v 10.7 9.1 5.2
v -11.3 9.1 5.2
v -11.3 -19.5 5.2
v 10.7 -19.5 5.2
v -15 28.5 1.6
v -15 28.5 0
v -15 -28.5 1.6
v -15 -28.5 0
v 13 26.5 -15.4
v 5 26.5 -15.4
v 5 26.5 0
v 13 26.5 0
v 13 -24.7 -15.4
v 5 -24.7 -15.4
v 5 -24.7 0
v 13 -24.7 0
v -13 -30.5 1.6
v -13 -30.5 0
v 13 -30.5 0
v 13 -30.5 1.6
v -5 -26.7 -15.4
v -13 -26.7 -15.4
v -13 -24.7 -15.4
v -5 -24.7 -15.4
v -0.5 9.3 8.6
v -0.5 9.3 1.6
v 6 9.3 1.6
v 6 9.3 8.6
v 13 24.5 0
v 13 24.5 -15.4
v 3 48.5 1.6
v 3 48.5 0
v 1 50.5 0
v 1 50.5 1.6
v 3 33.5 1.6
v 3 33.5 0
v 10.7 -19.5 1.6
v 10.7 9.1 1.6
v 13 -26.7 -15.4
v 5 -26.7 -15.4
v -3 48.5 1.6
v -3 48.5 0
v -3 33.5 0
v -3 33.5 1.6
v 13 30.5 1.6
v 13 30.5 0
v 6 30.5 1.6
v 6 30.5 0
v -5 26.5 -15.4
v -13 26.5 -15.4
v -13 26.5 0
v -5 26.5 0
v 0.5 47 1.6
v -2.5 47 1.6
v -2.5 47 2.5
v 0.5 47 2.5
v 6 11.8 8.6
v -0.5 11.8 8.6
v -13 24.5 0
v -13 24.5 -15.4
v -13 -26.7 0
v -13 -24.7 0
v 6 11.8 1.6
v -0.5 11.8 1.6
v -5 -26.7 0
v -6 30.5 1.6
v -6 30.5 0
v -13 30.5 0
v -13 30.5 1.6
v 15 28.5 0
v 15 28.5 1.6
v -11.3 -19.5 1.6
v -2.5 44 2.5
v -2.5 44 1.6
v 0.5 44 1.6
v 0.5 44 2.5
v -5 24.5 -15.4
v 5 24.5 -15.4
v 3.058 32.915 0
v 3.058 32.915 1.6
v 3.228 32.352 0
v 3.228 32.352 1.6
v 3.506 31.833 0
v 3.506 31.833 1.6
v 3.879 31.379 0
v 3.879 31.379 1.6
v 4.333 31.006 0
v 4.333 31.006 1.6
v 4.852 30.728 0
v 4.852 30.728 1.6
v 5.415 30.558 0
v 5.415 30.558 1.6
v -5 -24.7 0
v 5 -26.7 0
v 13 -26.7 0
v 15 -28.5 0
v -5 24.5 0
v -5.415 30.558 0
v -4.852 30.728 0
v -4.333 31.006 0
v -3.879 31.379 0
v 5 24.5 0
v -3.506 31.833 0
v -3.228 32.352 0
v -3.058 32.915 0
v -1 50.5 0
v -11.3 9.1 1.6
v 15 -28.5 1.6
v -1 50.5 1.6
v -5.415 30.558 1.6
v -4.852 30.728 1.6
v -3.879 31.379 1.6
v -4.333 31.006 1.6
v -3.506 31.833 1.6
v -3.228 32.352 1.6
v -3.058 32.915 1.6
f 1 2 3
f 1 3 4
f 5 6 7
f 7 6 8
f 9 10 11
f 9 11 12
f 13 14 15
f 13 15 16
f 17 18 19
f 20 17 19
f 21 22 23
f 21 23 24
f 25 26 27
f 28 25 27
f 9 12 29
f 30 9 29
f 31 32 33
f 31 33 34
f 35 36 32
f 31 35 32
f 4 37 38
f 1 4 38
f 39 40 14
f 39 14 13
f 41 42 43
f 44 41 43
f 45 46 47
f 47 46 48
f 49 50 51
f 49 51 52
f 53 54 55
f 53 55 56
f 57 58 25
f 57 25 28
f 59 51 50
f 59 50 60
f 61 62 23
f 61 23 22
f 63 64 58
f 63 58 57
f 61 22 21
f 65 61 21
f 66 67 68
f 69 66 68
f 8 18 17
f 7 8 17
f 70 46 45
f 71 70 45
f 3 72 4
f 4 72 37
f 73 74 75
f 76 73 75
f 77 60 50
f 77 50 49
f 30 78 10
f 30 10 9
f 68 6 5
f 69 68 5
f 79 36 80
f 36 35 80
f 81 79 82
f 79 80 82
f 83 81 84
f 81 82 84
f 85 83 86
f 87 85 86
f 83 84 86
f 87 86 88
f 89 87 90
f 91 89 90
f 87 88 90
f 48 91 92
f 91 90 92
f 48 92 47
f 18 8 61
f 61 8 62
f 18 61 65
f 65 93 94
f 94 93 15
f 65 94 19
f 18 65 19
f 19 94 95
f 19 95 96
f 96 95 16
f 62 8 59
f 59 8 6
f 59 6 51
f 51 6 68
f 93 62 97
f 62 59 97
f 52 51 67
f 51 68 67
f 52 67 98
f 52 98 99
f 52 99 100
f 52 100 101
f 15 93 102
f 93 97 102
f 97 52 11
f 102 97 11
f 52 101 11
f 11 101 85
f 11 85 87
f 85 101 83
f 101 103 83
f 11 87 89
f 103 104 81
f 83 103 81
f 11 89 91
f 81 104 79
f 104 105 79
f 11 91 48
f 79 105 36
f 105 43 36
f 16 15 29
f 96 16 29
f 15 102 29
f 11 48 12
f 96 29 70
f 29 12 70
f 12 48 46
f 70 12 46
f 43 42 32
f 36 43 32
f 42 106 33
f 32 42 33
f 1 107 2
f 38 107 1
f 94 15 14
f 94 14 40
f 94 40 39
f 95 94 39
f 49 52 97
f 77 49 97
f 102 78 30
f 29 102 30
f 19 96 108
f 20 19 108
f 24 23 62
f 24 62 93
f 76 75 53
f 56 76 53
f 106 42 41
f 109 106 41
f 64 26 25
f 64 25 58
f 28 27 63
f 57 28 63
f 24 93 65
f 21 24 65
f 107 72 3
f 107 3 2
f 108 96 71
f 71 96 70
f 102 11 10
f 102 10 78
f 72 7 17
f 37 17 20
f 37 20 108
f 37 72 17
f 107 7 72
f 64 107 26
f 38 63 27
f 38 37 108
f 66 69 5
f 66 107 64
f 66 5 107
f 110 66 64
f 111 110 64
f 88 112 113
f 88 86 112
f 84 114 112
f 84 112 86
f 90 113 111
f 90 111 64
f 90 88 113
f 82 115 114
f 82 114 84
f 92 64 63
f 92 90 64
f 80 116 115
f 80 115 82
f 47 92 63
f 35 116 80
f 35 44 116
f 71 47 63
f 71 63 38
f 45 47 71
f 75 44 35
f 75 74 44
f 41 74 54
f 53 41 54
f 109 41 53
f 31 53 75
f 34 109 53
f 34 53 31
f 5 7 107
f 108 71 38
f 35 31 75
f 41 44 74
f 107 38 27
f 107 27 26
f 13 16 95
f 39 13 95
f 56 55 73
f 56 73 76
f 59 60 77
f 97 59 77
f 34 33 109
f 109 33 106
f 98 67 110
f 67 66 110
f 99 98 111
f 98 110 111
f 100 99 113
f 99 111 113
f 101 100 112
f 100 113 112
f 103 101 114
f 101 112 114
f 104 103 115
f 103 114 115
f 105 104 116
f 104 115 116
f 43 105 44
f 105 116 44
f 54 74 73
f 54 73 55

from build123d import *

# Parameters (mm, degrees)
F1_DEPTH = 1.6
F2_W     = 22
F2_H     = 28.6
F3_DEPTH = 3.6
F2_W_2   = 6.5
F2_H_2   = 2.5
F4_DEPTH = 7
F2_W_3   = 3
F2_H_3   = 3
F5_DEPTH = 0.9
F6_W     = 8
F6_H     = 2
F7_DEPTH = 15.4
F8_R     = 3
F9_SIZE  = 2


with BuildPart() as f1:
    # F0 (on Top) → F1 (new body)
    with BuildSketch(Plane.XY):
        Polygon((-3, 30.5), (-15, 30.5), (-15, -30.5), (15, -30.5), (15, 30.5), (3, 30.5), (3, 50.5), (-3, 50.5), align=None)
    extrude(amount=F1_DEPTH)

    # F2 (on face) → F3 (join)
    with BuildSketch(Plane.XY.offset(1.6)):
        with Locations((-0.3, -5.2)):
            Rectangle(F2_W, F2_H)
    extrude(amount=F3_DEPTH)

    # F2 (on face) → F4 (join)
    with BuildSketch(Plane.XY.offset(1.6)):
        with Locations((2.75, 10.55)):
            Rectangle(F2_W_2, F2_H_2)
    extrude(amount=F4_DEPTH)

    # F2 (on face) → F5 (join)
    with BuildSketch(Plane.XY.offset(1.6)):
        with Locations((-1, 45.5)):
            Rectangle(F2_W_3, F2_H_3)
    extrude(amount=F5_DEPTH)

    # F6 (on face) → F7 (join)
    with BuildSketch(Plane(origin=(0, 0, 0), x_dir=(1, 0, 0), z_dir=(0, 0, -1))):
        with Locations((-9, 25.7)):
            Rectangle(F6_W, F6_H)
        with Locations((9, 25.7)):
            Rectangle(F6_W, F6_H)
        with Locations((-9, -25.5)):
            Rectangle(F6_W, F6_H)
        with Locations((9, -25.5)):
            Rectangle(F6_W, F6_H)
    extrude(amount=F7_DEPTH)

    # F8
    f8_edges = [f1.edges().sort_by_distance(p)[0] for p in [
        (-3, 30.5, 0.8),
        (3, 30.5, 0.8),
    ]]
    fillet(f8_edges, radius=F8_R)

    # F9
    f9_edges = [f1.edges().sort_by_distance(p)[0] for p in [
        (-15, 30.5, 0.8),
        (-15, -30.5, 0.8),
        (15, -30.5, 0.8),
        (15, 30.5, 0.8),
        (3, 50.5, 0.8),
        (-3, 50.5, 0.8),
    ]]
    chamfer(f9_edges, length=F9_SIZE)


solid = f1.part
